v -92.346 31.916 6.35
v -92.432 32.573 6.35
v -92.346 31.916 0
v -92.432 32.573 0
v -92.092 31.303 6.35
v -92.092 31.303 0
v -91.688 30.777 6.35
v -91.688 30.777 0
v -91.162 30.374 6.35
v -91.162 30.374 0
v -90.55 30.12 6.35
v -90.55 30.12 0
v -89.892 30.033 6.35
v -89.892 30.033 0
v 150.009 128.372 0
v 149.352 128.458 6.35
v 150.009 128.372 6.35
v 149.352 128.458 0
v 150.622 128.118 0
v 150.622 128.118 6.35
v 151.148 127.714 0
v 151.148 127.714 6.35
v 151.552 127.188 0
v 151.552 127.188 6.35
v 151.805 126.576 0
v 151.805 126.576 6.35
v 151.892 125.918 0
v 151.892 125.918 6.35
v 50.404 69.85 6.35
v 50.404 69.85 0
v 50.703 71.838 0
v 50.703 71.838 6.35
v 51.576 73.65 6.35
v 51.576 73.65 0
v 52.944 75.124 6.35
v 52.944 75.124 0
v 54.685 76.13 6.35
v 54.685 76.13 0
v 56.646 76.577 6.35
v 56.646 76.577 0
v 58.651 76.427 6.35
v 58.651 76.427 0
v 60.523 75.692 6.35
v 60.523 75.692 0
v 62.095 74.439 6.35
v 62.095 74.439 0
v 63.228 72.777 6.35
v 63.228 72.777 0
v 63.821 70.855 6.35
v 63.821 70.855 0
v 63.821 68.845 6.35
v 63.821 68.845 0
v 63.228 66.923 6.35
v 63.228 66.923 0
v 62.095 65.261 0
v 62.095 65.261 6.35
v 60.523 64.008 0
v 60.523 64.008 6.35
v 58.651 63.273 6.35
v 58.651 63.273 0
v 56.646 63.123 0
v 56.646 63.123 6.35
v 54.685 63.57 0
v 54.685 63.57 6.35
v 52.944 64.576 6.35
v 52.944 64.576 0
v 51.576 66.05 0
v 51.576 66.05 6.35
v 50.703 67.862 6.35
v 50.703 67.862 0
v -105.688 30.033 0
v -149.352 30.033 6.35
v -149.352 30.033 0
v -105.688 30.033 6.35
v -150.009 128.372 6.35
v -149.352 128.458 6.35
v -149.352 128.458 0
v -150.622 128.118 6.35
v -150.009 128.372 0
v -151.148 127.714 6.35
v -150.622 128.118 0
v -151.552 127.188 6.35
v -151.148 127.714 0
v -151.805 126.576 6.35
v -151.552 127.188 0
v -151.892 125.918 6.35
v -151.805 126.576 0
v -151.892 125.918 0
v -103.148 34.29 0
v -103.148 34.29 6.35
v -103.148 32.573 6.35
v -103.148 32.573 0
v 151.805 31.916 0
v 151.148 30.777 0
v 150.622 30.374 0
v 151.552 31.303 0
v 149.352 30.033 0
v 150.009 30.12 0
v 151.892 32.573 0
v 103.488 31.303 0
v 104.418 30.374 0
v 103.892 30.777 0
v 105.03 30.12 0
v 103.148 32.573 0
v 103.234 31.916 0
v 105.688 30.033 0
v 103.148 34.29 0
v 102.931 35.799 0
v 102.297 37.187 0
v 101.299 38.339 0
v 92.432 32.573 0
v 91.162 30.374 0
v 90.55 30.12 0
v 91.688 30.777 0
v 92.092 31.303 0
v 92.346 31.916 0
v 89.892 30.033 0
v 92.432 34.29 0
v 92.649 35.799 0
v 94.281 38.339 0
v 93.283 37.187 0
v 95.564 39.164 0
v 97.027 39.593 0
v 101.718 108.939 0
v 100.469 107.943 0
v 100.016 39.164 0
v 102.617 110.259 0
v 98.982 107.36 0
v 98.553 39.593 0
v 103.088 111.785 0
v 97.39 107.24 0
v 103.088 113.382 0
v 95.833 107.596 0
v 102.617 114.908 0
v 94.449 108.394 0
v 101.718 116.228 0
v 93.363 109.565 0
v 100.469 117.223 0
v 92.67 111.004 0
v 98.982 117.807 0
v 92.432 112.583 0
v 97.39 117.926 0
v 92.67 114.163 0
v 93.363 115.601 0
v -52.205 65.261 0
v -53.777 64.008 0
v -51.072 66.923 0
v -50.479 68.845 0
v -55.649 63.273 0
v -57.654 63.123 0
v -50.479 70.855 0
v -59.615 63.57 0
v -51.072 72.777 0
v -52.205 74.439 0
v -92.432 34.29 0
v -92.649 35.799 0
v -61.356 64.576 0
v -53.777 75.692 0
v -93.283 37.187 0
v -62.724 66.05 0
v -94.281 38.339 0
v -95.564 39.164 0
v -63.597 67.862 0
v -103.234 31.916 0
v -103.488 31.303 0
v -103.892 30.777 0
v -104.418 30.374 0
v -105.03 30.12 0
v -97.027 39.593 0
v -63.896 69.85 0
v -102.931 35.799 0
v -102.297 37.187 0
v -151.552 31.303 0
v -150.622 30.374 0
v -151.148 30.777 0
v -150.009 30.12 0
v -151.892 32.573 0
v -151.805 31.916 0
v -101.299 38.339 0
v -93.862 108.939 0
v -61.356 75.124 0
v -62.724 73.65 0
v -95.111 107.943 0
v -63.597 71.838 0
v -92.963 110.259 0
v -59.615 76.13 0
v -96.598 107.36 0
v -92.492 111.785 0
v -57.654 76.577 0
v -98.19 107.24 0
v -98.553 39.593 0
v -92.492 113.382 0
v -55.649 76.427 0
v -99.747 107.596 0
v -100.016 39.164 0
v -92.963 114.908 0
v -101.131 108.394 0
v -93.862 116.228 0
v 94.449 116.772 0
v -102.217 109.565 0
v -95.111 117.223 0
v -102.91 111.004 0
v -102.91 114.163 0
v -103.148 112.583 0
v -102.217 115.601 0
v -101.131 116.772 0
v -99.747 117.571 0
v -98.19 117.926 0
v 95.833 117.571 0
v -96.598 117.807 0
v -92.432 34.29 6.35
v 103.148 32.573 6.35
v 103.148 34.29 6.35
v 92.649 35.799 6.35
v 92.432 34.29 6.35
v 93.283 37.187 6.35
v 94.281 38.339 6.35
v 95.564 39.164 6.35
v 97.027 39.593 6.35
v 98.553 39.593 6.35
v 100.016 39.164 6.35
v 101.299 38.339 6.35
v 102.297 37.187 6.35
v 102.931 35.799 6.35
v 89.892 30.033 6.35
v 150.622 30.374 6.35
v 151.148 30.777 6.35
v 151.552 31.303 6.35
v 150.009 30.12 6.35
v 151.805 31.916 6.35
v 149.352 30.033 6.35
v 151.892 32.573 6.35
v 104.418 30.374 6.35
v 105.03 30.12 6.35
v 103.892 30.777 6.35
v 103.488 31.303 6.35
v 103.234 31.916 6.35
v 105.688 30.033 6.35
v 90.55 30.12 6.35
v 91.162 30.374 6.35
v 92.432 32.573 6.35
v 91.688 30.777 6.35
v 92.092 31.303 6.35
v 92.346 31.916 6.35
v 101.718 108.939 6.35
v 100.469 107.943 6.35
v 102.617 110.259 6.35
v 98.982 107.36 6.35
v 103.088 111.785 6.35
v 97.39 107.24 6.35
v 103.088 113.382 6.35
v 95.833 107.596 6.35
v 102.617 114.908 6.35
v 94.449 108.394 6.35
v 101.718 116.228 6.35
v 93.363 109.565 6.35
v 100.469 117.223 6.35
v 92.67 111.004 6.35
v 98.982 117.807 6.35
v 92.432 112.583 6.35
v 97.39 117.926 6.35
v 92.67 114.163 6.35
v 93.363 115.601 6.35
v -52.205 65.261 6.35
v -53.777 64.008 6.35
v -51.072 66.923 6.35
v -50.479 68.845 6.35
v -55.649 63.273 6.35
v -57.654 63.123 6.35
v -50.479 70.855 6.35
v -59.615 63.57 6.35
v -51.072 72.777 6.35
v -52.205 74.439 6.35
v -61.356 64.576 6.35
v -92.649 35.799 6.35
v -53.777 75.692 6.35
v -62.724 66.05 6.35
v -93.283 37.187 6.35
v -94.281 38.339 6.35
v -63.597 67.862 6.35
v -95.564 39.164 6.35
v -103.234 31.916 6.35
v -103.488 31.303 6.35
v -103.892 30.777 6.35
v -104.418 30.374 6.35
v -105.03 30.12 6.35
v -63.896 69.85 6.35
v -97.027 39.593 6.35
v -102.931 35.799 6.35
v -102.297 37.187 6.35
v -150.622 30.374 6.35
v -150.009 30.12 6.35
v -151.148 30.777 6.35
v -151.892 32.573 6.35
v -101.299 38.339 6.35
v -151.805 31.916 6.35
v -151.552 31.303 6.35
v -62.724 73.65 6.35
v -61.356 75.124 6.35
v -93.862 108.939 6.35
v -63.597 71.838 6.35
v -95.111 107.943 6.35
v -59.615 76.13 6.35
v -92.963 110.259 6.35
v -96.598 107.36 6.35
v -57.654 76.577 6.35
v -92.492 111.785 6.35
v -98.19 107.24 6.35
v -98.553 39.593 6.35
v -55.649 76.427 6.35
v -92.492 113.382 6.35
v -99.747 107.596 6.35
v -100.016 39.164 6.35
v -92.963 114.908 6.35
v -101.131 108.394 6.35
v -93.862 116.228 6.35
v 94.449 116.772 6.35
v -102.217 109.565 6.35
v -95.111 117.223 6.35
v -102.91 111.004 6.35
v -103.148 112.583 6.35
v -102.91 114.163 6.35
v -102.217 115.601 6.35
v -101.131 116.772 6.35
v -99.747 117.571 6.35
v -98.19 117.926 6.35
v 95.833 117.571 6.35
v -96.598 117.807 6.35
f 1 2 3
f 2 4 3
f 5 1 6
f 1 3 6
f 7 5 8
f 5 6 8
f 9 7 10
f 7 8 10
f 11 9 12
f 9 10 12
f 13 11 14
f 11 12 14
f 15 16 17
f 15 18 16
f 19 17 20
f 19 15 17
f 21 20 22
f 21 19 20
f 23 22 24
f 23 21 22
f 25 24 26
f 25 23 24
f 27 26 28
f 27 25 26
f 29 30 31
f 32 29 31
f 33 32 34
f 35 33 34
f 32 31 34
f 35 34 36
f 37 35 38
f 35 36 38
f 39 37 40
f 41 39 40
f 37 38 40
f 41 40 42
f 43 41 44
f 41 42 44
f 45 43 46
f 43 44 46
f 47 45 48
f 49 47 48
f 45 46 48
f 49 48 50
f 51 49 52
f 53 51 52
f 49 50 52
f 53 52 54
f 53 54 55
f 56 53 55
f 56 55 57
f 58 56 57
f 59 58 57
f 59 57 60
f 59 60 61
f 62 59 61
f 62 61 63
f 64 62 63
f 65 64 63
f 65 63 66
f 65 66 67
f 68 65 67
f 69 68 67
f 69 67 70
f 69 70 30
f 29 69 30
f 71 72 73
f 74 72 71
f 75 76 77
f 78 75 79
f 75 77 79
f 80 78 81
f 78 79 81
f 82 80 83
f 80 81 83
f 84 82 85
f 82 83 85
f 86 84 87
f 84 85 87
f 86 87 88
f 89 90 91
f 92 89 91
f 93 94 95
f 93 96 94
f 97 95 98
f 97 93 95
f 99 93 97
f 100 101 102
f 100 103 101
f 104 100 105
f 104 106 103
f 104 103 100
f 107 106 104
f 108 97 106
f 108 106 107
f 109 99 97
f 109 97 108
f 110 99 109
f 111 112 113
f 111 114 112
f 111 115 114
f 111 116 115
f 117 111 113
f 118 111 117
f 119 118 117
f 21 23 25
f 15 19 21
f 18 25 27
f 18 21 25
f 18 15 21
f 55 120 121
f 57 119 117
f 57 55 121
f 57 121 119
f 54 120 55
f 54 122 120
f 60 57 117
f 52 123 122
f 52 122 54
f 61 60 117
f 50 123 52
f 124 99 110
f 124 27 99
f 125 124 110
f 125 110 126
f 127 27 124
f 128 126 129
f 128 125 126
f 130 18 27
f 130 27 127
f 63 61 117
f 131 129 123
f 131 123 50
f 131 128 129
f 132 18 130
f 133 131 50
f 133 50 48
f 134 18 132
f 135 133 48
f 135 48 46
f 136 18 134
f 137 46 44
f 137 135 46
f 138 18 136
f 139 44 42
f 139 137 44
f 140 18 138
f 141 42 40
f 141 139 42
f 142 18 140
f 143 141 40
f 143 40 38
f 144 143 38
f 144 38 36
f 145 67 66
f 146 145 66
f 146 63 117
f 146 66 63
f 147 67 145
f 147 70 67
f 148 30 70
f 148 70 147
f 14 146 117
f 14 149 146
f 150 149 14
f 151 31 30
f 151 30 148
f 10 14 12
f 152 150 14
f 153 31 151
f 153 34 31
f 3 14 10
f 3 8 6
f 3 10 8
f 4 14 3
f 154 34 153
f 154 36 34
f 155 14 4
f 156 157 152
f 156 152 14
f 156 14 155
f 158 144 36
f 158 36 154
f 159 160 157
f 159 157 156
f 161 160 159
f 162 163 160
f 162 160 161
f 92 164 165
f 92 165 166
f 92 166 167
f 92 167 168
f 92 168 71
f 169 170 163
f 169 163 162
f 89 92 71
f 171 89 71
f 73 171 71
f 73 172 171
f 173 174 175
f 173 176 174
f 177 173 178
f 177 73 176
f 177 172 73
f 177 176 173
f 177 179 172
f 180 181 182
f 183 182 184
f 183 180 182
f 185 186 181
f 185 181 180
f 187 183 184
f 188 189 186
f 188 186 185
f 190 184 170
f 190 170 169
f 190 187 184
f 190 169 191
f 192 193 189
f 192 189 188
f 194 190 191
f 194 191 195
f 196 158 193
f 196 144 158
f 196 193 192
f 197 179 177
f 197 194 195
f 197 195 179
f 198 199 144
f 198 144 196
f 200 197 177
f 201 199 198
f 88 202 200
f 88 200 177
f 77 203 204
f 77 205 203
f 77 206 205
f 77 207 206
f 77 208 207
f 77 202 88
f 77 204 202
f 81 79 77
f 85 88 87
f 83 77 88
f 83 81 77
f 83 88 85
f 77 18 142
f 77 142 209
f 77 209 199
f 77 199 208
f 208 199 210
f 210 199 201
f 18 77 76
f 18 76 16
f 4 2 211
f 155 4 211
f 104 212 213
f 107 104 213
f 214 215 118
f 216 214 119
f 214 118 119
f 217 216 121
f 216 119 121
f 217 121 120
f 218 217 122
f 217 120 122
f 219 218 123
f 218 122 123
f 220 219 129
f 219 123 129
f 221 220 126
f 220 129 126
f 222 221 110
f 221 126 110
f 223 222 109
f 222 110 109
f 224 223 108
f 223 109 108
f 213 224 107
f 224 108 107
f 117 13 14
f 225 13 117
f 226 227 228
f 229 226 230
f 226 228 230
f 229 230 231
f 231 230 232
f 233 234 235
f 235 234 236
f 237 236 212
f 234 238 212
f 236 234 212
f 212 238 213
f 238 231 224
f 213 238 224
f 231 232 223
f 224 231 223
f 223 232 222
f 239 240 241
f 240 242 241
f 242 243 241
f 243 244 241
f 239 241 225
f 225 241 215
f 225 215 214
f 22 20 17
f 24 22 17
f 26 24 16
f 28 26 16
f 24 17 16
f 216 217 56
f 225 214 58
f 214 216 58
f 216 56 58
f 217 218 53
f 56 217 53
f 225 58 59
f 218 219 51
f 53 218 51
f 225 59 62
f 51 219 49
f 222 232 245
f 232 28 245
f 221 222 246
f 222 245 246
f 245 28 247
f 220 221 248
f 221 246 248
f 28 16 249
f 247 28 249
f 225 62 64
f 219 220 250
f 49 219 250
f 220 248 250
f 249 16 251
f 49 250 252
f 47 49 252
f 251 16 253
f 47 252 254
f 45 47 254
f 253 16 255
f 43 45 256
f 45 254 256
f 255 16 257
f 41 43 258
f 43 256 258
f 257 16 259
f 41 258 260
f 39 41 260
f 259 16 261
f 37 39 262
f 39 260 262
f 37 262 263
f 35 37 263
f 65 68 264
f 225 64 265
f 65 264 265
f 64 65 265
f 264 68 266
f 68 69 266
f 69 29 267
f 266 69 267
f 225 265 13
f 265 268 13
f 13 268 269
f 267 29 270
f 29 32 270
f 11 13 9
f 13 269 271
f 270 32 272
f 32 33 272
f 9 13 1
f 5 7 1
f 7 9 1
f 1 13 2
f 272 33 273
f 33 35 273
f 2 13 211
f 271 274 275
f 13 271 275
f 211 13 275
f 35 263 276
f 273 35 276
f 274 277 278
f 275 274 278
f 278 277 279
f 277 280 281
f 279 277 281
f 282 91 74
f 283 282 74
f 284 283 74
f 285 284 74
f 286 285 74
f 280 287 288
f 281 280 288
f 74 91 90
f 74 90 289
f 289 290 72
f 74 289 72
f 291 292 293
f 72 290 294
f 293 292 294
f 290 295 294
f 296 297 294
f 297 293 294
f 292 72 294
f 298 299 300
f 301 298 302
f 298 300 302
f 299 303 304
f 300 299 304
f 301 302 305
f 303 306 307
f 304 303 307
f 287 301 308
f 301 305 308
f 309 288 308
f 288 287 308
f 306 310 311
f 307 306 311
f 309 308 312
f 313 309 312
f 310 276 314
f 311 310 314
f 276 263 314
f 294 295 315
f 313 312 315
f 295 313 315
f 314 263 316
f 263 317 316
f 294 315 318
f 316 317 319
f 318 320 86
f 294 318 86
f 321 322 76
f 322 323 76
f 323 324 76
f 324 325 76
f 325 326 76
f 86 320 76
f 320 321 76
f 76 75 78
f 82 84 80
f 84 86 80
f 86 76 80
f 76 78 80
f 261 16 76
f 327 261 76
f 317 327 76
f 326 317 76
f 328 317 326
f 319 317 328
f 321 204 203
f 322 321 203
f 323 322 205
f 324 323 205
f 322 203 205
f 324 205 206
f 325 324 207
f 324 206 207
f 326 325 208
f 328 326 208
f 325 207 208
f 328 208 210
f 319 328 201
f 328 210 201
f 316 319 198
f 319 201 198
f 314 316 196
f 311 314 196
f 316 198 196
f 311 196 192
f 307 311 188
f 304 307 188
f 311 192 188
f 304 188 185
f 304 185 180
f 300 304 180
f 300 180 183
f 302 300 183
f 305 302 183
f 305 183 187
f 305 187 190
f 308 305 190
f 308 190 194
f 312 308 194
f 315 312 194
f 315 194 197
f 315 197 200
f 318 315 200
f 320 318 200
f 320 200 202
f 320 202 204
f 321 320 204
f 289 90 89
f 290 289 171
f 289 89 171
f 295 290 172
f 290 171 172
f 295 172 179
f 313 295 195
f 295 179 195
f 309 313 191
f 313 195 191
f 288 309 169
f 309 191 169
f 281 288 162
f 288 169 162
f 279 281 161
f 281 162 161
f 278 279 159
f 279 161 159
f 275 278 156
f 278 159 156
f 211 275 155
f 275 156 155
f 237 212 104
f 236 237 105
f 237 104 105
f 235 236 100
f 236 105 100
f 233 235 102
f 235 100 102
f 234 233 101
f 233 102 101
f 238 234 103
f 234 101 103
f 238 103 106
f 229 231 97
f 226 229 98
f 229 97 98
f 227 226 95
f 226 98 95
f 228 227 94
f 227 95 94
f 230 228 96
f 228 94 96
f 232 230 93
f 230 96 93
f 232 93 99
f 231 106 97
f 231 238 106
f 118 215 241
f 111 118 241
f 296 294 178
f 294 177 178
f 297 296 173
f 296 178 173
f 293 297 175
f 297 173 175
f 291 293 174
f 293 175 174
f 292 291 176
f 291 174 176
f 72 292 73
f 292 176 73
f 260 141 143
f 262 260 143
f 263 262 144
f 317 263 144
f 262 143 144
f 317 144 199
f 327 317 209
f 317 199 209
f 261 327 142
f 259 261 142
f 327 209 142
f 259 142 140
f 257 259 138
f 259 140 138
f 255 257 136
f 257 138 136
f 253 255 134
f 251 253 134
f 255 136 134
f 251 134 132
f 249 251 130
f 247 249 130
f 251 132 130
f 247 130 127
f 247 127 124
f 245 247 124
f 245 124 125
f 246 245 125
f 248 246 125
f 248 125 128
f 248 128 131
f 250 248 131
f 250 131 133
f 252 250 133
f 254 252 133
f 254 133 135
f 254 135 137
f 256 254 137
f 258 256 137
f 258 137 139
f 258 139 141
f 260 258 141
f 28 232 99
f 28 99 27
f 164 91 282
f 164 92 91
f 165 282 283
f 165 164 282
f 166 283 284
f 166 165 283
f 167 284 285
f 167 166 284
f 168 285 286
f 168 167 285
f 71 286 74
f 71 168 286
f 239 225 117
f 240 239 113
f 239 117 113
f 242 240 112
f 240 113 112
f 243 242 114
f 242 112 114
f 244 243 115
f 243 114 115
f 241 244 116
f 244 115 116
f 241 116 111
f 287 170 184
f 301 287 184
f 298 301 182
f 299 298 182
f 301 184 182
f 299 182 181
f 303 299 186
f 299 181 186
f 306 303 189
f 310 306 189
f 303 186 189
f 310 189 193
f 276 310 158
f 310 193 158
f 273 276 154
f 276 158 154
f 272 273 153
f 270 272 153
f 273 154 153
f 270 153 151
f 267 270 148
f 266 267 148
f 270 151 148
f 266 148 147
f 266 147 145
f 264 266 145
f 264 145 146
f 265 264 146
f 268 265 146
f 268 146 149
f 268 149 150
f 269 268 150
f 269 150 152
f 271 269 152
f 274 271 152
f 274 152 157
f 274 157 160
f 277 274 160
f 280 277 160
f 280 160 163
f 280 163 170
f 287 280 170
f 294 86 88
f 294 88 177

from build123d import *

# Parameters (mm, degrees)
BOSS_EXTRUDE1_DEPTH              = 6.35
CUT_EXTRUDE3_DEPTH               = 221.472033966
F_27_64_0_42188_DIAMETER_HOLE1_D = 10.715752
FILLET1_R                        = 2.54
F_1_2_CLEARANCE_HOLE1_D          = 13.49248
SKETCH7_W                        = 303.784
SKETCH7_H                        = 55.43328257
CUT_EXTRUDE1_DEPTH               = 200.030230178
CUT_EXTRUDE2_DEPTH               = 200.030230178
FILLET2_R                        = 2.54


with BuildPart() as part:
    # Sketch1 → Boss-Extrude1 (new body)
    with BuildSketch(Plane.XY):
        with BuildLine():
            Line((-179.07, -25.4), (-179.07, 128.45828257))
            Line((-179.07, 128.45828257), (179.07, 128.45828257))
            Line((179.07, 128.45828257), (179.07, -25.4))
            Line((179.07, -25.4), (153.67, -25.4))
            Line((153.67, -25.4), (153.67, -1.27))
            ThreePointArc((153.67, -1.27), (127, 25.4), (100.33, -1.27))
            Line((100.33, -1.27), (100.33, -25.4))
            Line((100.33, -25.4), (-100.33, -25.4))
            Line((-100.33, -25.4), (-100.33, -1.27))
            ThreePointArc((-100.33, -1.27), (-127, 25.4), (-153.67, -1.27))
            Line((-153.67, -1.27), (-153.67, -25.4))
            Line((-153.67, -25.4), (-179.07, -25.4))
        make_face()
    extrude(amount=BOSS_EXTRUDE1_DEPTH)

    # Sketch9 → Cut-Extrude3 (cut, through all)
    with BuildSketch(Plane.XY.offset(6.35)):
        with BuildLine():
            Line((-151.892, 128.45828257), (-151.892, 8.304823027))
            ThreePointArc((-151.892, 8.304823027), (-153.22173278, 3.599253536), (-153.67, -1.27))
            Line((-153.67, -1.27), (-153.67, -25.4))
            Line((-153.67, -25.4), (-179.07, -25.4))
            Line((-179.07, -25.4), (-179.07, 128.45828257))
            Line((-179.07, 128.45828257), (-151.892, 128.45828257))
        make_face()
        with BuildLine():
            Line((153.67, -25.4), (153.67, -1.27))
            ThreePointArc((153.67, -1.27), (153.22173278, 3.599253536), (151.892, 8.304823027))
            Line((151.892, 8.304823027), (151.892, 128.45828257))
            Line((151.892, 128.45828257), (179.07, 128.45828257))
            Line((179.07, 128.45828257), (179.07, -25.4))
            Line((179.07, -25.4), (153.67, -25.4))
        make_face()
    extrude(amount=-CUT_EXTRUDE3_DEPTH, mode=Mode.SUBTRACT)

    # 27/64 (0.42188) Diameter Hole1 (through all)
    with Locations(Plane.XY.offset(6.35)):
        with Locations((-97.79, 34.29), (-97.79, 112.58328257), (97.79, 34.29), (97.79, 112.58328257)):
            Hole(F_27_64_0_42188_DIAMETER_HOLE1_D / 2)

    # Fillet1
    fillet1_edges = [part.edges().sort_by_distance(p)[0] for p in [
        (100.33, -25.4, 3.175),
        (-100.33, -25.4, 3.175),
        (-151.892, 128.45828257, 3.175),
        (-151.892, 8.304823027, 3.175),
        (151.892, 8.304823027, 3.175),
        (151.892, 128.45828257, 3.175),
    ]]
    fillet(fillet1_edges, radius=FILLET1_R)

    # 1/2 Clearance Hole1 (through all)
    with Locations(Plane.XY.offset(6.35)):
        with Locations((57.15, 69.85), (-57.15, 69.85)):
            Hole(F_1_2_CLEARANCE_HOLE1_D / 2)

    # Sketch7 → Cut-Extrude1 (cut, through all)
    with BuildSketch(Plane.XY.offset(6.35)):
        with Locations((0, 2.316641285)):
            Rectangle(SKETCH7_W, SKETCH7_H)
    extrude(amount=-CUT_EXTRUDE1_DEPTH, mode=Mode.SUBTRACT)

    # Sketch8 → Cut-Extrude2 (cut, through all)
    with BuildSketch(Plane.XY.offset(6.35)):
        Polygon((-94.536203455, 30.03328257), (-92.432124, 30.03328257), (-92.432124, 34.29), align=None)
        Polygon((-103.147876, 34.29), (-103.147876, 30.03328257), (-101.043796545, 30.03328257), align=None)
        Polygon((101.043796545, 30.03328257), (103.147876, 30.03328257), (103.147876, 34.29), align=None)
        Polygon((92.432124, 34.29), (92.432124, 30.03328257), (94.536203455, 30.03328257), align=None)
    extrude(amount=-CUT_EXTRUDE2_DEPTH, mode=Mode.SUBTRACT)

    # Fillet2
    fillet2_edges = [part.edges().sort_by_distance(p)[0] for p in [
        (-151.892, 30.03328257, 3.175),
        (151.892, 30.03328257, 3.175),
        (-103.147876, 30.03328257, 3.175),
        (103.147876, 30.03328257, 3.175),
        (92.432124, 30.03328257, 3.175),
        (-92.432124, 30.03328257, 3.175),
    ]]
    fillet(fillet2_edges, radius=FILLET2_R)


solid = part.part
